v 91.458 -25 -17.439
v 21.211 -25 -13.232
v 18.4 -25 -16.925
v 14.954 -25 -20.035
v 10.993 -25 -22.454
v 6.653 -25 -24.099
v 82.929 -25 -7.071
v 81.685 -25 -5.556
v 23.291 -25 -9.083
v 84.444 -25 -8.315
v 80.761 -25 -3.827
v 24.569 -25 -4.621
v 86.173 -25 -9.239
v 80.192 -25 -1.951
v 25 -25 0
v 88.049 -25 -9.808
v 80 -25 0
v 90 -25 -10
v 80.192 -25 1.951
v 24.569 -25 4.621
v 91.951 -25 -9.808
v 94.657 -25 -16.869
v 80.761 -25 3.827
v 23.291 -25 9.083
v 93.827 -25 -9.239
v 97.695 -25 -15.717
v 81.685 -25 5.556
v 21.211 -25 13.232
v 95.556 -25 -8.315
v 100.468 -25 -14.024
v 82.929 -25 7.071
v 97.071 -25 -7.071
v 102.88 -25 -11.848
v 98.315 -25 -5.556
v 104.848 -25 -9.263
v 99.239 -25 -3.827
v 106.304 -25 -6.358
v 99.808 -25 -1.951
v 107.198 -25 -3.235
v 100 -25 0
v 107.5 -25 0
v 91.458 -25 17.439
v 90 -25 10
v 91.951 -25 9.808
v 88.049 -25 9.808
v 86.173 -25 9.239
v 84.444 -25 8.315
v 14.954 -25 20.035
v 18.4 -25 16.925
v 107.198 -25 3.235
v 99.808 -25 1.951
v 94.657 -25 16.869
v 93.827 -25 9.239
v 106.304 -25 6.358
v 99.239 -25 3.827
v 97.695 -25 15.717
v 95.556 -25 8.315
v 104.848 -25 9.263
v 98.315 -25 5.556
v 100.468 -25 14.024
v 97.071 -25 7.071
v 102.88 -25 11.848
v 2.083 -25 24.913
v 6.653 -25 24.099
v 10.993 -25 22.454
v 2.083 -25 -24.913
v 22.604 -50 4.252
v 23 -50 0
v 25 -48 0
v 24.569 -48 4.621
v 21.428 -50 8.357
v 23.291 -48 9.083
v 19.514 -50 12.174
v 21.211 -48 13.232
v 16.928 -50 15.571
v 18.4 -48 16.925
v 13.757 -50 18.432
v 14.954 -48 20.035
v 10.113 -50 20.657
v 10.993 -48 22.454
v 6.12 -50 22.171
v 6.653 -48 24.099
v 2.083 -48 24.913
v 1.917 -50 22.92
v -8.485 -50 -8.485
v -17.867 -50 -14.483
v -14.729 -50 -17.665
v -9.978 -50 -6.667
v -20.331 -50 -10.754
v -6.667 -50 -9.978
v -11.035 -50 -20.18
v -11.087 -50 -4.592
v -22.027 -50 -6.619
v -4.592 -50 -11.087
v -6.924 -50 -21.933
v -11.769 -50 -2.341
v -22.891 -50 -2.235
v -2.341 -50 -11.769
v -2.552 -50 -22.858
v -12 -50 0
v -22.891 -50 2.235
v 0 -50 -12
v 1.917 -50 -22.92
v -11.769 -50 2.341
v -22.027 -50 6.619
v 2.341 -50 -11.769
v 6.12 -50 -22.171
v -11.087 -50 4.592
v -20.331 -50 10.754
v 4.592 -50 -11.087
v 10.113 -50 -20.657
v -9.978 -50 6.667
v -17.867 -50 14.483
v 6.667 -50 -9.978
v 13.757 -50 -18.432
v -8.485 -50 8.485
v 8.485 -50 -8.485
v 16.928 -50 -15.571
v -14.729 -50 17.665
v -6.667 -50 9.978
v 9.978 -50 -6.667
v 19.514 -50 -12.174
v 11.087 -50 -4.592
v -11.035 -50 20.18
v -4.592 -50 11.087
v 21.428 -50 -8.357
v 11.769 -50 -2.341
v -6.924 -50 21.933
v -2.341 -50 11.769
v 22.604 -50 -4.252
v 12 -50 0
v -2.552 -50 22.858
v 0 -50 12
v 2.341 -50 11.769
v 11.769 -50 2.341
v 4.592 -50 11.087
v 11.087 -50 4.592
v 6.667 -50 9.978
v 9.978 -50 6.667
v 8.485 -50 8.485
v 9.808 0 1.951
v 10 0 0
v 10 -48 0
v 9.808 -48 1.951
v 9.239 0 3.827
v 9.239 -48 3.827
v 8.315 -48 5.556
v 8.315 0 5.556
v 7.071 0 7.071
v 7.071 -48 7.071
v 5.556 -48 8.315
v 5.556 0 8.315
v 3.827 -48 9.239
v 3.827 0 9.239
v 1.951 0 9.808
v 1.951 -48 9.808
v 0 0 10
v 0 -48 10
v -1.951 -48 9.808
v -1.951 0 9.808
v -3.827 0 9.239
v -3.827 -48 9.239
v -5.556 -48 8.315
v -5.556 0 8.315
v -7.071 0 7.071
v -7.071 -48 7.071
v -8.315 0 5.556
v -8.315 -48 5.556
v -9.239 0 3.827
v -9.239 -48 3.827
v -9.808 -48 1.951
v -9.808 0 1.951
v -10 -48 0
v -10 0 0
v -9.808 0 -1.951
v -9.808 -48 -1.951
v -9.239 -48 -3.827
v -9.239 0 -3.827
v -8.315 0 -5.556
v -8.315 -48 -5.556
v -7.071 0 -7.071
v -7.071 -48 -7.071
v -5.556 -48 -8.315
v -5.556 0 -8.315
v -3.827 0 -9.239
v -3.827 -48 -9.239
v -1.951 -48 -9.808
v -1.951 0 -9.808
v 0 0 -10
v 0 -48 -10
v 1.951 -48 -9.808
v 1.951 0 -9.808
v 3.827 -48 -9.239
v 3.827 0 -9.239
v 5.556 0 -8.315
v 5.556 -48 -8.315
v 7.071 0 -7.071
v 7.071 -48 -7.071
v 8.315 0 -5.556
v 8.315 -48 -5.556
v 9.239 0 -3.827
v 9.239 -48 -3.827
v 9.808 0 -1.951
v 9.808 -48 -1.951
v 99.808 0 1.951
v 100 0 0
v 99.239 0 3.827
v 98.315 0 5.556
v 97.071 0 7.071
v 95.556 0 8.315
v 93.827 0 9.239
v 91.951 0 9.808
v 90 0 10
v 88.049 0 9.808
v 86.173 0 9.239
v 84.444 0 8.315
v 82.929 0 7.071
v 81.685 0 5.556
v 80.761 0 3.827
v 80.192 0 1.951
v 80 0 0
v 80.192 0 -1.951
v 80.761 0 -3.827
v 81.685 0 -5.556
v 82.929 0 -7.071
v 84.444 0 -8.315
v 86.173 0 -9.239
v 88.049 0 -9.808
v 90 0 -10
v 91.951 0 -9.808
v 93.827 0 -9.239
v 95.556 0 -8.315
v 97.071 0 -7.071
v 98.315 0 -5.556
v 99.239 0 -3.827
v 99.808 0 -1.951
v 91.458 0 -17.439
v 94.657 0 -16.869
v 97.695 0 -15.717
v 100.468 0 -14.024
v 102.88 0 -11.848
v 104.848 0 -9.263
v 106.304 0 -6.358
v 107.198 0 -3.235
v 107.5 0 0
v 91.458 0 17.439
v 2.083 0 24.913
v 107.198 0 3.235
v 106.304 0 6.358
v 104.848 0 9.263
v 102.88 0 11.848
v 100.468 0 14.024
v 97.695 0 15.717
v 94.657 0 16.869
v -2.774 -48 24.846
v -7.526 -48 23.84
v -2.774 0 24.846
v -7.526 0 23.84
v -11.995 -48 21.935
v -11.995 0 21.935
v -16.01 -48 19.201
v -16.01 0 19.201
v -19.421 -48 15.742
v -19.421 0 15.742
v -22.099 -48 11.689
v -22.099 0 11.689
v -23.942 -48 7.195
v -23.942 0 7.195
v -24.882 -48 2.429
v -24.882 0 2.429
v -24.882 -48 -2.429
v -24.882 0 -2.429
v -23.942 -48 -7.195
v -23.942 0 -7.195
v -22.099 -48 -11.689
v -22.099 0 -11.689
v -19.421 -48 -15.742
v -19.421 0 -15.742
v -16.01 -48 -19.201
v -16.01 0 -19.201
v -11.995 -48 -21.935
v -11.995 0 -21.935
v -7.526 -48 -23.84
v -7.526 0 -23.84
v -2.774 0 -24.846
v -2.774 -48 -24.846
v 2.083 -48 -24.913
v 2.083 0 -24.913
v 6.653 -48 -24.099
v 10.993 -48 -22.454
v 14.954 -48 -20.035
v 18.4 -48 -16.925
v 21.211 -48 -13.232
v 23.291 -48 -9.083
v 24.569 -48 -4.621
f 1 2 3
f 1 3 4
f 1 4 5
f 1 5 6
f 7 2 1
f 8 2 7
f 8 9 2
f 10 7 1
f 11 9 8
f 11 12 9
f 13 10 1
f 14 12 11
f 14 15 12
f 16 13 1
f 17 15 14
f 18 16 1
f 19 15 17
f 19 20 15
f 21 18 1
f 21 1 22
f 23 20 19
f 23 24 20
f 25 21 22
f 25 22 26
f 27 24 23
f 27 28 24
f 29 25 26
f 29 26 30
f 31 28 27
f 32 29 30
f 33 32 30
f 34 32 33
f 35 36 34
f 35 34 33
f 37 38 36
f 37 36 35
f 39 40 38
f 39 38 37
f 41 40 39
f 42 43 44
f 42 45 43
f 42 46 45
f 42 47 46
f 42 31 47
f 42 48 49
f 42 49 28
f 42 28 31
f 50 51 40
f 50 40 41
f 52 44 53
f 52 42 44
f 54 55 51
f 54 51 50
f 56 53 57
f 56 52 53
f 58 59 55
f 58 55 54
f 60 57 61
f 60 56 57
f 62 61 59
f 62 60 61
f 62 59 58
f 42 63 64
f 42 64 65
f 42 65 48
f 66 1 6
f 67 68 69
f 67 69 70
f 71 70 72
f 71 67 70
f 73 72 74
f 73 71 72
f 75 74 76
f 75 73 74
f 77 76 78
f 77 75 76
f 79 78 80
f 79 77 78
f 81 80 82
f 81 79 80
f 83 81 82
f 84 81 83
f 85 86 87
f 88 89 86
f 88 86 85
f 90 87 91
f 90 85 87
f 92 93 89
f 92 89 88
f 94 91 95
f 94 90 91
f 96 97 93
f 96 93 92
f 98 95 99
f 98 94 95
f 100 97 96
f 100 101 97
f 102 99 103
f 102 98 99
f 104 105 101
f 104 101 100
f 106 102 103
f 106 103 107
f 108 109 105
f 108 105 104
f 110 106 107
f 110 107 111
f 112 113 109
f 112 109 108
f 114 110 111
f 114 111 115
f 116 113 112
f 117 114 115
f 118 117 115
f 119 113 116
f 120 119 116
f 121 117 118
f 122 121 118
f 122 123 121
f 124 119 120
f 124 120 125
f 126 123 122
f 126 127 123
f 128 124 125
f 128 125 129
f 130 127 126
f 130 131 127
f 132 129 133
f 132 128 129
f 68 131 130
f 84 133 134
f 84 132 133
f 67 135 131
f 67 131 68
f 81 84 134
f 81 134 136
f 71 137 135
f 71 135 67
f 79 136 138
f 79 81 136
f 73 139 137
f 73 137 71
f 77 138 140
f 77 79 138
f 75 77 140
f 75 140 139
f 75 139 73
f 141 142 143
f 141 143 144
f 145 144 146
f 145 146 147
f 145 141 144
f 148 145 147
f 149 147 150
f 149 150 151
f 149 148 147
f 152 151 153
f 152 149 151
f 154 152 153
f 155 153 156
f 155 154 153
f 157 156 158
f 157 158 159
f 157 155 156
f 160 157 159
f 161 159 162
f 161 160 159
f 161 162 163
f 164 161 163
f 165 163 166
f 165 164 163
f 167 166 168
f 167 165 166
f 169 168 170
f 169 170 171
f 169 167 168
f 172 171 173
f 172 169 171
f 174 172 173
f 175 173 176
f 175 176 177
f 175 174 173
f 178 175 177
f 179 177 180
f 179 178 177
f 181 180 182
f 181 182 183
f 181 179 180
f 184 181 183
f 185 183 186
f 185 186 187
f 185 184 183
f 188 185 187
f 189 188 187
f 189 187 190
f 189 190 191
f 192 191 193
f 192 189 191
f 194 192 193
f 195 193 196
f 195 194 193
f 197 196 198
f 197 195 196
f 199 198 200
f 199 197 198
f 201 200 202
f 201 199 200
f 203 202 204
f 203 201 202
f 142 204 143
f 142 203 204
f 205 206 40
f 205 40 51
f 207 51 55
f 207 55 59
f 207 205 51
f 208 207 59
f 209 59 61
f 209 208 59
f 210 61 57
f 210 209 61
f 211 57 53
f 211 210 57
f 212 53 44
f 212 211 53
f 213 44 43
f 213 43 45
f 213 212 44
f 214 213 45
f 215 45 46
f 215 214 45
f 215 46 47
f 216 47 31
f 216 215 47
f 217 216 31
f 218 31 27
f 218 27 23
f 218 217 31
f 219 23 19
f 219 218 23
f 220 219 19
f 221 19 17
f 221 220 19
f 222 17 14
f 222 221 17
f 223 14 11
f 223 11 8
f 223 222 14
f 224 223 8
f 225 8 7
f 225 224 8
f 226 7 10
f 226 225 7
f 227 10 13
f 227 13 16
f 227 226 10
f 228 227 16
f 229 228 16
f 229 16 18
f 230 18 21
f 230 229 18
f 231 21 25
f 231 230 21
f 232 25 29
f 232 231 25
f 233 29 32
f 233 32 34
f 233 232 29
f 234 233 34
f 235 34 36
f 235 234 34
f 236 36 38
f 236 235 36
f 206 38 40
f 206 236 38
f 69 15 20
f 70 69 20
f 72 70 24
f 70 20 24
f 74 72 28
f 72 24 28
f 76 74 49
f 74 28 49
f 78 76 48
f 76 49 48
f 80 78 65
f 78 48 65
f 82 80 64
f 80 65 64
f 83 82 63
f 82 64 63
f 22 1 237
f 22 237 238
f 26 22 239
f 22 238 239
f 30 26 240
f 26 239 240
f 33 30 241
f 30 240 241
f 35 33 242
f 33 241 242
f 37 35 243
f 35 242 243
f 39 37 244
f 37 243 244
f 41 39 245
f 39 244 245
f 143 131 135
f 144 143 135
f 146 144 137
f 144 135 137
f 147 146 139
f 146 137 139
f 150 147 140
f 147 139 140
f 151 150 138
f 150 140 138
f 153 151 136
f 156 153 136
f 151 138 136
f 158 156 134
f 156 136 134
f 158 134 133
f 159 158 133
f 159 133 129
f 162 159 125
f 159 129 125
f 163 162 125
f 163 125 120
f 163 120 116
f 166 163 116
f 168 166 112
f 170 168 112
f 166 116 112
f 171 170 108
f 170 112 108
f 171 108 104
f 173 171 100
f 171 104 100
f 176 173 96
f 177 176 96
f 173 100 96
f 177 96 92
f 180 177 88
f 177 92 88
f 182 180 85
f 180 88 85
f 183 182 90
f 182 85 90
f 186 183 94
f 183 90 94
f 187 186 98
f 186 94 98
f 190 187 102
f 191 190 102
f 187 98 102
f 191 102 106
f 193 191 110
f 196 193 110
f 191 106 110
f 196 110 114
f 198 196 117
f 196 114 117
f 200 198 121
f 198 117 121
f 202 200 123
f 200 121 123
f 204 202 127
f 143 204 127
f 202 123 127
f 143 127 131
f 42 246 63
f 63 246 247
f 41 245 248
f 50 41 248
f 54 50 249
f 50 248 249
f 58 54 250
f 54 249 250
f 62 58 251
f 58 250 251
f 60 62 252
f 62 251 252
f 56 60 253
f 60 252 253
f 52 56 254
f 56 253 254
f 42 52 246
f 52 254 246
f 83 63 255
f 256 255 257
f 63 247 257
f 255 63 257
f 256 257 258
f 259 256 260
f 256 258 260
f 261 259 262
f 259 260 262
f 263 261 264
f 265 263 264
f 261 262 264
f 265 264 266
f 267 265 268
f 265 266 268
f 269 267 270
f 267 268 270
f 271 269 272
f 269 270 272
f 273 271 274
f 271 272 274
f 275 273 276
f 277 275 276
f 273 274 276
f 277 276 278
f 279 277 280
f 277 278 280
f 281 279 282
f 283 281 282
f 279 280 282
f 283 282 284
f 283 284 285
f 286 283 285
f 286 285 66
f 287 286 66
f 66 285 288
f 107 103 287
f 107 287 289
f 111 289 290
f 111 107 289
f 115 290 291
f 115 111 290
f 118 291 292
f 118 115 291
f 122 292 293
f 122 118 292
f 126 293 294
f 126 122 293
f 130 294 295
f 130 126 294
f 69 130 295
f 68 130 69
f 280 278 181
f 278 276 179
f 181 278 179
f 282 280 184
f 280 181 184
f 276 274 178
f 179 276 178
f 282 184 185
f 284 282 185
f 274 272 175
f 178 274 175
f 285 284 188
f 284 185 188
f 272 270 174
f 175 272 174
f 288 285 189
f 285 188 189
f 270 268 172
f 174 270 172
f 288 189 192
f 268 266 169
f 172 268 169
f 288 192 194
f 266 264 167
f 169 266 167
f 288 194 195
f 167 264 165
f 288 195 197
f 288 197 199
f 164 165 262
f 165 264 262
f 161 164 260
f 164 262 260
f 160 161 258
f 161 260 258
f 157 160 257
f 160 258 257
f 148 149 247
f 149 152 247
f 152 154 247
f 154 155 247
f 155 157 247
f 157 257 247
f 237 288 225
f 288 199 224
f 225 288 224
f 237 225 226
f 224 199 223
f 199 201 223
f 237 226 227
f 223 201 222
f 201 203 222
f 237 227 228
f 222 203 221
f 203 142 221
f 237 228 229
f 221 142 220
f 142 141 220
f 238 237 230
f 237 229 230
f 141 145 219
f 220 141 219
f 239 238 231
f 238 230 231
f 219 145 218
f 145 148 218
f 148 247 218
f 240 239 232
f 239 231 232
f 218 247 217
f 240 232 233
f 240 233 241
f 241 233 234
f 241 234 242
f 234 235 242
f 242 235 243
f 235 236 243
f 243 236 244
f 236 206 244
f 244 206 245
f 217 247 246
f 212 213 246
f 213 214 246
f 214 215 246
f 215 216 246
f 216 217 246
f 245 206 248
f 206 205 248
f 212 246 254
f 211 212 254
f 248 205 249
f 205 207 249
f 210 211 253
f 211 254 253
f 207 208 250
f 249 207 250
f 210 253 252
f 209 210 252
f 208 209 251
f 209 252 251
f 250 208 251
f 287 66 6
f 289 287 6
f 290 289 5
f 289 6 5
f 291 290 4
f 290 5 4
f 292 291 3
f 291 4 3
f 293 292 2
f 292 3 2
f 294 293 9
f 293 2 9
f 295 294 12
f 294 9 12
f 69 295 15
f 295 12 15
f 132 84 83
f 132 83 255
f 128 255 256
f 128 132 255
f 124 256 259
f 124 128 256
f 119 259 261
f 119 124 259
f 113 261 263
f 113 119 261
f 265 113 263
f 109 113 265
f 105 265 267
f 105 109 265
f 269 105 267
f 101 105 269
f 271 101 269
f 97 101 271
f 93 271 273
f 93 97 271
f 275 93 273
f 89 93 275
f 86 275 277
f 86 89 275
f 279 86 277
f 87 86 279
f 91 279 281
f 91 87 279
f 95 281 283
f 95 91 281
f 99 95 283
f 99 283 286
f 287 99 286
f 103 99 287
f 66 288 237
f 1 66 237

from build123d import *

# Parameters (mm, degrees)
F0_R     = 10
F1_DEPTH = 25
F2_DEPTH = 50
F3_SIZE  = 2


with BuildPart() as f1:
    # F0 (on Front) → F1 (new body)
    with BuildSketch(Plane.XZ):
        with BuildLine():
            ThreePointArc((2.083333, -24.913043), (18.399502, -16.92508), (25, 0))
            ThreePointArc((25, 0), (18.399502, 16.92508), (2.083333, 24.913043))
            ThreePointArc((2.083333, 24.913043), (-25, 0), (2.083333, -24.913043))
        make_face()
        Circle(F0_R, mode=Mode.SUBTRACT)
        with BuildLine():
            ThreePointArc((2.083333, 24.913043), (18.399502, 16.92508), (25, 0))
            ThreePointArc((25, 0), (18.399502, -16.92508), (2.083333, -24.913043))
            Line((2.083333, -24.913043), (91.458333, -17.43913))
            ThreePointArc((91.458333, -17.43913), (72.5, 0), (91.458333, 17.43913))
            Line((91.458333, 17.43913), (2.083333, 24.913043))
        make_face()
        with BuildLine():
            ThreePointArc((107.5, 0), (102.879651, 11.847556), (91.458333, 17.43913))
            ThreePointArc((91.458333, 17.43913), (72.5, 0), (91.458333, -17.43913))
            ThreePointArc((91.458333, -17.43913), (102.879651, -11.847556), (107.5, 0))
        make_face()
        with Locations((90, 0)):
            Circle(F0_R, mode=Mode.SUBTRACT)
    extrude(amount=F1_DEPTH)

    # F0 (on Front) → F2 (join)
    with BuildSketch(Plane.XZ):
        with BuildLine():
            ThreePointArc((2.083333, -24.913043), (18.399502, -16.92508), (25, 0))
            ThreePointArc((25, 0), (18.399502, 16.92508), (2.083333, 24.913043))
            ThreePointArc((2.083333, 24.913043), (-25, 0), (2.083333, -24.913043))
        make_face()
        Circle(F0_R, mode=Mode.SUBTRACT)
    extrude(amount=F2_DEPTH)

    # F3
    f3_edges = [f1.edges().sort_by_distance(p)[0] for p in [
        (-2.083333, -50, 24.913043),
        (-10, -50, 0),
    ]]
    chamfer(f3_edges, length=F3_SIZE)


solid = f1.part
